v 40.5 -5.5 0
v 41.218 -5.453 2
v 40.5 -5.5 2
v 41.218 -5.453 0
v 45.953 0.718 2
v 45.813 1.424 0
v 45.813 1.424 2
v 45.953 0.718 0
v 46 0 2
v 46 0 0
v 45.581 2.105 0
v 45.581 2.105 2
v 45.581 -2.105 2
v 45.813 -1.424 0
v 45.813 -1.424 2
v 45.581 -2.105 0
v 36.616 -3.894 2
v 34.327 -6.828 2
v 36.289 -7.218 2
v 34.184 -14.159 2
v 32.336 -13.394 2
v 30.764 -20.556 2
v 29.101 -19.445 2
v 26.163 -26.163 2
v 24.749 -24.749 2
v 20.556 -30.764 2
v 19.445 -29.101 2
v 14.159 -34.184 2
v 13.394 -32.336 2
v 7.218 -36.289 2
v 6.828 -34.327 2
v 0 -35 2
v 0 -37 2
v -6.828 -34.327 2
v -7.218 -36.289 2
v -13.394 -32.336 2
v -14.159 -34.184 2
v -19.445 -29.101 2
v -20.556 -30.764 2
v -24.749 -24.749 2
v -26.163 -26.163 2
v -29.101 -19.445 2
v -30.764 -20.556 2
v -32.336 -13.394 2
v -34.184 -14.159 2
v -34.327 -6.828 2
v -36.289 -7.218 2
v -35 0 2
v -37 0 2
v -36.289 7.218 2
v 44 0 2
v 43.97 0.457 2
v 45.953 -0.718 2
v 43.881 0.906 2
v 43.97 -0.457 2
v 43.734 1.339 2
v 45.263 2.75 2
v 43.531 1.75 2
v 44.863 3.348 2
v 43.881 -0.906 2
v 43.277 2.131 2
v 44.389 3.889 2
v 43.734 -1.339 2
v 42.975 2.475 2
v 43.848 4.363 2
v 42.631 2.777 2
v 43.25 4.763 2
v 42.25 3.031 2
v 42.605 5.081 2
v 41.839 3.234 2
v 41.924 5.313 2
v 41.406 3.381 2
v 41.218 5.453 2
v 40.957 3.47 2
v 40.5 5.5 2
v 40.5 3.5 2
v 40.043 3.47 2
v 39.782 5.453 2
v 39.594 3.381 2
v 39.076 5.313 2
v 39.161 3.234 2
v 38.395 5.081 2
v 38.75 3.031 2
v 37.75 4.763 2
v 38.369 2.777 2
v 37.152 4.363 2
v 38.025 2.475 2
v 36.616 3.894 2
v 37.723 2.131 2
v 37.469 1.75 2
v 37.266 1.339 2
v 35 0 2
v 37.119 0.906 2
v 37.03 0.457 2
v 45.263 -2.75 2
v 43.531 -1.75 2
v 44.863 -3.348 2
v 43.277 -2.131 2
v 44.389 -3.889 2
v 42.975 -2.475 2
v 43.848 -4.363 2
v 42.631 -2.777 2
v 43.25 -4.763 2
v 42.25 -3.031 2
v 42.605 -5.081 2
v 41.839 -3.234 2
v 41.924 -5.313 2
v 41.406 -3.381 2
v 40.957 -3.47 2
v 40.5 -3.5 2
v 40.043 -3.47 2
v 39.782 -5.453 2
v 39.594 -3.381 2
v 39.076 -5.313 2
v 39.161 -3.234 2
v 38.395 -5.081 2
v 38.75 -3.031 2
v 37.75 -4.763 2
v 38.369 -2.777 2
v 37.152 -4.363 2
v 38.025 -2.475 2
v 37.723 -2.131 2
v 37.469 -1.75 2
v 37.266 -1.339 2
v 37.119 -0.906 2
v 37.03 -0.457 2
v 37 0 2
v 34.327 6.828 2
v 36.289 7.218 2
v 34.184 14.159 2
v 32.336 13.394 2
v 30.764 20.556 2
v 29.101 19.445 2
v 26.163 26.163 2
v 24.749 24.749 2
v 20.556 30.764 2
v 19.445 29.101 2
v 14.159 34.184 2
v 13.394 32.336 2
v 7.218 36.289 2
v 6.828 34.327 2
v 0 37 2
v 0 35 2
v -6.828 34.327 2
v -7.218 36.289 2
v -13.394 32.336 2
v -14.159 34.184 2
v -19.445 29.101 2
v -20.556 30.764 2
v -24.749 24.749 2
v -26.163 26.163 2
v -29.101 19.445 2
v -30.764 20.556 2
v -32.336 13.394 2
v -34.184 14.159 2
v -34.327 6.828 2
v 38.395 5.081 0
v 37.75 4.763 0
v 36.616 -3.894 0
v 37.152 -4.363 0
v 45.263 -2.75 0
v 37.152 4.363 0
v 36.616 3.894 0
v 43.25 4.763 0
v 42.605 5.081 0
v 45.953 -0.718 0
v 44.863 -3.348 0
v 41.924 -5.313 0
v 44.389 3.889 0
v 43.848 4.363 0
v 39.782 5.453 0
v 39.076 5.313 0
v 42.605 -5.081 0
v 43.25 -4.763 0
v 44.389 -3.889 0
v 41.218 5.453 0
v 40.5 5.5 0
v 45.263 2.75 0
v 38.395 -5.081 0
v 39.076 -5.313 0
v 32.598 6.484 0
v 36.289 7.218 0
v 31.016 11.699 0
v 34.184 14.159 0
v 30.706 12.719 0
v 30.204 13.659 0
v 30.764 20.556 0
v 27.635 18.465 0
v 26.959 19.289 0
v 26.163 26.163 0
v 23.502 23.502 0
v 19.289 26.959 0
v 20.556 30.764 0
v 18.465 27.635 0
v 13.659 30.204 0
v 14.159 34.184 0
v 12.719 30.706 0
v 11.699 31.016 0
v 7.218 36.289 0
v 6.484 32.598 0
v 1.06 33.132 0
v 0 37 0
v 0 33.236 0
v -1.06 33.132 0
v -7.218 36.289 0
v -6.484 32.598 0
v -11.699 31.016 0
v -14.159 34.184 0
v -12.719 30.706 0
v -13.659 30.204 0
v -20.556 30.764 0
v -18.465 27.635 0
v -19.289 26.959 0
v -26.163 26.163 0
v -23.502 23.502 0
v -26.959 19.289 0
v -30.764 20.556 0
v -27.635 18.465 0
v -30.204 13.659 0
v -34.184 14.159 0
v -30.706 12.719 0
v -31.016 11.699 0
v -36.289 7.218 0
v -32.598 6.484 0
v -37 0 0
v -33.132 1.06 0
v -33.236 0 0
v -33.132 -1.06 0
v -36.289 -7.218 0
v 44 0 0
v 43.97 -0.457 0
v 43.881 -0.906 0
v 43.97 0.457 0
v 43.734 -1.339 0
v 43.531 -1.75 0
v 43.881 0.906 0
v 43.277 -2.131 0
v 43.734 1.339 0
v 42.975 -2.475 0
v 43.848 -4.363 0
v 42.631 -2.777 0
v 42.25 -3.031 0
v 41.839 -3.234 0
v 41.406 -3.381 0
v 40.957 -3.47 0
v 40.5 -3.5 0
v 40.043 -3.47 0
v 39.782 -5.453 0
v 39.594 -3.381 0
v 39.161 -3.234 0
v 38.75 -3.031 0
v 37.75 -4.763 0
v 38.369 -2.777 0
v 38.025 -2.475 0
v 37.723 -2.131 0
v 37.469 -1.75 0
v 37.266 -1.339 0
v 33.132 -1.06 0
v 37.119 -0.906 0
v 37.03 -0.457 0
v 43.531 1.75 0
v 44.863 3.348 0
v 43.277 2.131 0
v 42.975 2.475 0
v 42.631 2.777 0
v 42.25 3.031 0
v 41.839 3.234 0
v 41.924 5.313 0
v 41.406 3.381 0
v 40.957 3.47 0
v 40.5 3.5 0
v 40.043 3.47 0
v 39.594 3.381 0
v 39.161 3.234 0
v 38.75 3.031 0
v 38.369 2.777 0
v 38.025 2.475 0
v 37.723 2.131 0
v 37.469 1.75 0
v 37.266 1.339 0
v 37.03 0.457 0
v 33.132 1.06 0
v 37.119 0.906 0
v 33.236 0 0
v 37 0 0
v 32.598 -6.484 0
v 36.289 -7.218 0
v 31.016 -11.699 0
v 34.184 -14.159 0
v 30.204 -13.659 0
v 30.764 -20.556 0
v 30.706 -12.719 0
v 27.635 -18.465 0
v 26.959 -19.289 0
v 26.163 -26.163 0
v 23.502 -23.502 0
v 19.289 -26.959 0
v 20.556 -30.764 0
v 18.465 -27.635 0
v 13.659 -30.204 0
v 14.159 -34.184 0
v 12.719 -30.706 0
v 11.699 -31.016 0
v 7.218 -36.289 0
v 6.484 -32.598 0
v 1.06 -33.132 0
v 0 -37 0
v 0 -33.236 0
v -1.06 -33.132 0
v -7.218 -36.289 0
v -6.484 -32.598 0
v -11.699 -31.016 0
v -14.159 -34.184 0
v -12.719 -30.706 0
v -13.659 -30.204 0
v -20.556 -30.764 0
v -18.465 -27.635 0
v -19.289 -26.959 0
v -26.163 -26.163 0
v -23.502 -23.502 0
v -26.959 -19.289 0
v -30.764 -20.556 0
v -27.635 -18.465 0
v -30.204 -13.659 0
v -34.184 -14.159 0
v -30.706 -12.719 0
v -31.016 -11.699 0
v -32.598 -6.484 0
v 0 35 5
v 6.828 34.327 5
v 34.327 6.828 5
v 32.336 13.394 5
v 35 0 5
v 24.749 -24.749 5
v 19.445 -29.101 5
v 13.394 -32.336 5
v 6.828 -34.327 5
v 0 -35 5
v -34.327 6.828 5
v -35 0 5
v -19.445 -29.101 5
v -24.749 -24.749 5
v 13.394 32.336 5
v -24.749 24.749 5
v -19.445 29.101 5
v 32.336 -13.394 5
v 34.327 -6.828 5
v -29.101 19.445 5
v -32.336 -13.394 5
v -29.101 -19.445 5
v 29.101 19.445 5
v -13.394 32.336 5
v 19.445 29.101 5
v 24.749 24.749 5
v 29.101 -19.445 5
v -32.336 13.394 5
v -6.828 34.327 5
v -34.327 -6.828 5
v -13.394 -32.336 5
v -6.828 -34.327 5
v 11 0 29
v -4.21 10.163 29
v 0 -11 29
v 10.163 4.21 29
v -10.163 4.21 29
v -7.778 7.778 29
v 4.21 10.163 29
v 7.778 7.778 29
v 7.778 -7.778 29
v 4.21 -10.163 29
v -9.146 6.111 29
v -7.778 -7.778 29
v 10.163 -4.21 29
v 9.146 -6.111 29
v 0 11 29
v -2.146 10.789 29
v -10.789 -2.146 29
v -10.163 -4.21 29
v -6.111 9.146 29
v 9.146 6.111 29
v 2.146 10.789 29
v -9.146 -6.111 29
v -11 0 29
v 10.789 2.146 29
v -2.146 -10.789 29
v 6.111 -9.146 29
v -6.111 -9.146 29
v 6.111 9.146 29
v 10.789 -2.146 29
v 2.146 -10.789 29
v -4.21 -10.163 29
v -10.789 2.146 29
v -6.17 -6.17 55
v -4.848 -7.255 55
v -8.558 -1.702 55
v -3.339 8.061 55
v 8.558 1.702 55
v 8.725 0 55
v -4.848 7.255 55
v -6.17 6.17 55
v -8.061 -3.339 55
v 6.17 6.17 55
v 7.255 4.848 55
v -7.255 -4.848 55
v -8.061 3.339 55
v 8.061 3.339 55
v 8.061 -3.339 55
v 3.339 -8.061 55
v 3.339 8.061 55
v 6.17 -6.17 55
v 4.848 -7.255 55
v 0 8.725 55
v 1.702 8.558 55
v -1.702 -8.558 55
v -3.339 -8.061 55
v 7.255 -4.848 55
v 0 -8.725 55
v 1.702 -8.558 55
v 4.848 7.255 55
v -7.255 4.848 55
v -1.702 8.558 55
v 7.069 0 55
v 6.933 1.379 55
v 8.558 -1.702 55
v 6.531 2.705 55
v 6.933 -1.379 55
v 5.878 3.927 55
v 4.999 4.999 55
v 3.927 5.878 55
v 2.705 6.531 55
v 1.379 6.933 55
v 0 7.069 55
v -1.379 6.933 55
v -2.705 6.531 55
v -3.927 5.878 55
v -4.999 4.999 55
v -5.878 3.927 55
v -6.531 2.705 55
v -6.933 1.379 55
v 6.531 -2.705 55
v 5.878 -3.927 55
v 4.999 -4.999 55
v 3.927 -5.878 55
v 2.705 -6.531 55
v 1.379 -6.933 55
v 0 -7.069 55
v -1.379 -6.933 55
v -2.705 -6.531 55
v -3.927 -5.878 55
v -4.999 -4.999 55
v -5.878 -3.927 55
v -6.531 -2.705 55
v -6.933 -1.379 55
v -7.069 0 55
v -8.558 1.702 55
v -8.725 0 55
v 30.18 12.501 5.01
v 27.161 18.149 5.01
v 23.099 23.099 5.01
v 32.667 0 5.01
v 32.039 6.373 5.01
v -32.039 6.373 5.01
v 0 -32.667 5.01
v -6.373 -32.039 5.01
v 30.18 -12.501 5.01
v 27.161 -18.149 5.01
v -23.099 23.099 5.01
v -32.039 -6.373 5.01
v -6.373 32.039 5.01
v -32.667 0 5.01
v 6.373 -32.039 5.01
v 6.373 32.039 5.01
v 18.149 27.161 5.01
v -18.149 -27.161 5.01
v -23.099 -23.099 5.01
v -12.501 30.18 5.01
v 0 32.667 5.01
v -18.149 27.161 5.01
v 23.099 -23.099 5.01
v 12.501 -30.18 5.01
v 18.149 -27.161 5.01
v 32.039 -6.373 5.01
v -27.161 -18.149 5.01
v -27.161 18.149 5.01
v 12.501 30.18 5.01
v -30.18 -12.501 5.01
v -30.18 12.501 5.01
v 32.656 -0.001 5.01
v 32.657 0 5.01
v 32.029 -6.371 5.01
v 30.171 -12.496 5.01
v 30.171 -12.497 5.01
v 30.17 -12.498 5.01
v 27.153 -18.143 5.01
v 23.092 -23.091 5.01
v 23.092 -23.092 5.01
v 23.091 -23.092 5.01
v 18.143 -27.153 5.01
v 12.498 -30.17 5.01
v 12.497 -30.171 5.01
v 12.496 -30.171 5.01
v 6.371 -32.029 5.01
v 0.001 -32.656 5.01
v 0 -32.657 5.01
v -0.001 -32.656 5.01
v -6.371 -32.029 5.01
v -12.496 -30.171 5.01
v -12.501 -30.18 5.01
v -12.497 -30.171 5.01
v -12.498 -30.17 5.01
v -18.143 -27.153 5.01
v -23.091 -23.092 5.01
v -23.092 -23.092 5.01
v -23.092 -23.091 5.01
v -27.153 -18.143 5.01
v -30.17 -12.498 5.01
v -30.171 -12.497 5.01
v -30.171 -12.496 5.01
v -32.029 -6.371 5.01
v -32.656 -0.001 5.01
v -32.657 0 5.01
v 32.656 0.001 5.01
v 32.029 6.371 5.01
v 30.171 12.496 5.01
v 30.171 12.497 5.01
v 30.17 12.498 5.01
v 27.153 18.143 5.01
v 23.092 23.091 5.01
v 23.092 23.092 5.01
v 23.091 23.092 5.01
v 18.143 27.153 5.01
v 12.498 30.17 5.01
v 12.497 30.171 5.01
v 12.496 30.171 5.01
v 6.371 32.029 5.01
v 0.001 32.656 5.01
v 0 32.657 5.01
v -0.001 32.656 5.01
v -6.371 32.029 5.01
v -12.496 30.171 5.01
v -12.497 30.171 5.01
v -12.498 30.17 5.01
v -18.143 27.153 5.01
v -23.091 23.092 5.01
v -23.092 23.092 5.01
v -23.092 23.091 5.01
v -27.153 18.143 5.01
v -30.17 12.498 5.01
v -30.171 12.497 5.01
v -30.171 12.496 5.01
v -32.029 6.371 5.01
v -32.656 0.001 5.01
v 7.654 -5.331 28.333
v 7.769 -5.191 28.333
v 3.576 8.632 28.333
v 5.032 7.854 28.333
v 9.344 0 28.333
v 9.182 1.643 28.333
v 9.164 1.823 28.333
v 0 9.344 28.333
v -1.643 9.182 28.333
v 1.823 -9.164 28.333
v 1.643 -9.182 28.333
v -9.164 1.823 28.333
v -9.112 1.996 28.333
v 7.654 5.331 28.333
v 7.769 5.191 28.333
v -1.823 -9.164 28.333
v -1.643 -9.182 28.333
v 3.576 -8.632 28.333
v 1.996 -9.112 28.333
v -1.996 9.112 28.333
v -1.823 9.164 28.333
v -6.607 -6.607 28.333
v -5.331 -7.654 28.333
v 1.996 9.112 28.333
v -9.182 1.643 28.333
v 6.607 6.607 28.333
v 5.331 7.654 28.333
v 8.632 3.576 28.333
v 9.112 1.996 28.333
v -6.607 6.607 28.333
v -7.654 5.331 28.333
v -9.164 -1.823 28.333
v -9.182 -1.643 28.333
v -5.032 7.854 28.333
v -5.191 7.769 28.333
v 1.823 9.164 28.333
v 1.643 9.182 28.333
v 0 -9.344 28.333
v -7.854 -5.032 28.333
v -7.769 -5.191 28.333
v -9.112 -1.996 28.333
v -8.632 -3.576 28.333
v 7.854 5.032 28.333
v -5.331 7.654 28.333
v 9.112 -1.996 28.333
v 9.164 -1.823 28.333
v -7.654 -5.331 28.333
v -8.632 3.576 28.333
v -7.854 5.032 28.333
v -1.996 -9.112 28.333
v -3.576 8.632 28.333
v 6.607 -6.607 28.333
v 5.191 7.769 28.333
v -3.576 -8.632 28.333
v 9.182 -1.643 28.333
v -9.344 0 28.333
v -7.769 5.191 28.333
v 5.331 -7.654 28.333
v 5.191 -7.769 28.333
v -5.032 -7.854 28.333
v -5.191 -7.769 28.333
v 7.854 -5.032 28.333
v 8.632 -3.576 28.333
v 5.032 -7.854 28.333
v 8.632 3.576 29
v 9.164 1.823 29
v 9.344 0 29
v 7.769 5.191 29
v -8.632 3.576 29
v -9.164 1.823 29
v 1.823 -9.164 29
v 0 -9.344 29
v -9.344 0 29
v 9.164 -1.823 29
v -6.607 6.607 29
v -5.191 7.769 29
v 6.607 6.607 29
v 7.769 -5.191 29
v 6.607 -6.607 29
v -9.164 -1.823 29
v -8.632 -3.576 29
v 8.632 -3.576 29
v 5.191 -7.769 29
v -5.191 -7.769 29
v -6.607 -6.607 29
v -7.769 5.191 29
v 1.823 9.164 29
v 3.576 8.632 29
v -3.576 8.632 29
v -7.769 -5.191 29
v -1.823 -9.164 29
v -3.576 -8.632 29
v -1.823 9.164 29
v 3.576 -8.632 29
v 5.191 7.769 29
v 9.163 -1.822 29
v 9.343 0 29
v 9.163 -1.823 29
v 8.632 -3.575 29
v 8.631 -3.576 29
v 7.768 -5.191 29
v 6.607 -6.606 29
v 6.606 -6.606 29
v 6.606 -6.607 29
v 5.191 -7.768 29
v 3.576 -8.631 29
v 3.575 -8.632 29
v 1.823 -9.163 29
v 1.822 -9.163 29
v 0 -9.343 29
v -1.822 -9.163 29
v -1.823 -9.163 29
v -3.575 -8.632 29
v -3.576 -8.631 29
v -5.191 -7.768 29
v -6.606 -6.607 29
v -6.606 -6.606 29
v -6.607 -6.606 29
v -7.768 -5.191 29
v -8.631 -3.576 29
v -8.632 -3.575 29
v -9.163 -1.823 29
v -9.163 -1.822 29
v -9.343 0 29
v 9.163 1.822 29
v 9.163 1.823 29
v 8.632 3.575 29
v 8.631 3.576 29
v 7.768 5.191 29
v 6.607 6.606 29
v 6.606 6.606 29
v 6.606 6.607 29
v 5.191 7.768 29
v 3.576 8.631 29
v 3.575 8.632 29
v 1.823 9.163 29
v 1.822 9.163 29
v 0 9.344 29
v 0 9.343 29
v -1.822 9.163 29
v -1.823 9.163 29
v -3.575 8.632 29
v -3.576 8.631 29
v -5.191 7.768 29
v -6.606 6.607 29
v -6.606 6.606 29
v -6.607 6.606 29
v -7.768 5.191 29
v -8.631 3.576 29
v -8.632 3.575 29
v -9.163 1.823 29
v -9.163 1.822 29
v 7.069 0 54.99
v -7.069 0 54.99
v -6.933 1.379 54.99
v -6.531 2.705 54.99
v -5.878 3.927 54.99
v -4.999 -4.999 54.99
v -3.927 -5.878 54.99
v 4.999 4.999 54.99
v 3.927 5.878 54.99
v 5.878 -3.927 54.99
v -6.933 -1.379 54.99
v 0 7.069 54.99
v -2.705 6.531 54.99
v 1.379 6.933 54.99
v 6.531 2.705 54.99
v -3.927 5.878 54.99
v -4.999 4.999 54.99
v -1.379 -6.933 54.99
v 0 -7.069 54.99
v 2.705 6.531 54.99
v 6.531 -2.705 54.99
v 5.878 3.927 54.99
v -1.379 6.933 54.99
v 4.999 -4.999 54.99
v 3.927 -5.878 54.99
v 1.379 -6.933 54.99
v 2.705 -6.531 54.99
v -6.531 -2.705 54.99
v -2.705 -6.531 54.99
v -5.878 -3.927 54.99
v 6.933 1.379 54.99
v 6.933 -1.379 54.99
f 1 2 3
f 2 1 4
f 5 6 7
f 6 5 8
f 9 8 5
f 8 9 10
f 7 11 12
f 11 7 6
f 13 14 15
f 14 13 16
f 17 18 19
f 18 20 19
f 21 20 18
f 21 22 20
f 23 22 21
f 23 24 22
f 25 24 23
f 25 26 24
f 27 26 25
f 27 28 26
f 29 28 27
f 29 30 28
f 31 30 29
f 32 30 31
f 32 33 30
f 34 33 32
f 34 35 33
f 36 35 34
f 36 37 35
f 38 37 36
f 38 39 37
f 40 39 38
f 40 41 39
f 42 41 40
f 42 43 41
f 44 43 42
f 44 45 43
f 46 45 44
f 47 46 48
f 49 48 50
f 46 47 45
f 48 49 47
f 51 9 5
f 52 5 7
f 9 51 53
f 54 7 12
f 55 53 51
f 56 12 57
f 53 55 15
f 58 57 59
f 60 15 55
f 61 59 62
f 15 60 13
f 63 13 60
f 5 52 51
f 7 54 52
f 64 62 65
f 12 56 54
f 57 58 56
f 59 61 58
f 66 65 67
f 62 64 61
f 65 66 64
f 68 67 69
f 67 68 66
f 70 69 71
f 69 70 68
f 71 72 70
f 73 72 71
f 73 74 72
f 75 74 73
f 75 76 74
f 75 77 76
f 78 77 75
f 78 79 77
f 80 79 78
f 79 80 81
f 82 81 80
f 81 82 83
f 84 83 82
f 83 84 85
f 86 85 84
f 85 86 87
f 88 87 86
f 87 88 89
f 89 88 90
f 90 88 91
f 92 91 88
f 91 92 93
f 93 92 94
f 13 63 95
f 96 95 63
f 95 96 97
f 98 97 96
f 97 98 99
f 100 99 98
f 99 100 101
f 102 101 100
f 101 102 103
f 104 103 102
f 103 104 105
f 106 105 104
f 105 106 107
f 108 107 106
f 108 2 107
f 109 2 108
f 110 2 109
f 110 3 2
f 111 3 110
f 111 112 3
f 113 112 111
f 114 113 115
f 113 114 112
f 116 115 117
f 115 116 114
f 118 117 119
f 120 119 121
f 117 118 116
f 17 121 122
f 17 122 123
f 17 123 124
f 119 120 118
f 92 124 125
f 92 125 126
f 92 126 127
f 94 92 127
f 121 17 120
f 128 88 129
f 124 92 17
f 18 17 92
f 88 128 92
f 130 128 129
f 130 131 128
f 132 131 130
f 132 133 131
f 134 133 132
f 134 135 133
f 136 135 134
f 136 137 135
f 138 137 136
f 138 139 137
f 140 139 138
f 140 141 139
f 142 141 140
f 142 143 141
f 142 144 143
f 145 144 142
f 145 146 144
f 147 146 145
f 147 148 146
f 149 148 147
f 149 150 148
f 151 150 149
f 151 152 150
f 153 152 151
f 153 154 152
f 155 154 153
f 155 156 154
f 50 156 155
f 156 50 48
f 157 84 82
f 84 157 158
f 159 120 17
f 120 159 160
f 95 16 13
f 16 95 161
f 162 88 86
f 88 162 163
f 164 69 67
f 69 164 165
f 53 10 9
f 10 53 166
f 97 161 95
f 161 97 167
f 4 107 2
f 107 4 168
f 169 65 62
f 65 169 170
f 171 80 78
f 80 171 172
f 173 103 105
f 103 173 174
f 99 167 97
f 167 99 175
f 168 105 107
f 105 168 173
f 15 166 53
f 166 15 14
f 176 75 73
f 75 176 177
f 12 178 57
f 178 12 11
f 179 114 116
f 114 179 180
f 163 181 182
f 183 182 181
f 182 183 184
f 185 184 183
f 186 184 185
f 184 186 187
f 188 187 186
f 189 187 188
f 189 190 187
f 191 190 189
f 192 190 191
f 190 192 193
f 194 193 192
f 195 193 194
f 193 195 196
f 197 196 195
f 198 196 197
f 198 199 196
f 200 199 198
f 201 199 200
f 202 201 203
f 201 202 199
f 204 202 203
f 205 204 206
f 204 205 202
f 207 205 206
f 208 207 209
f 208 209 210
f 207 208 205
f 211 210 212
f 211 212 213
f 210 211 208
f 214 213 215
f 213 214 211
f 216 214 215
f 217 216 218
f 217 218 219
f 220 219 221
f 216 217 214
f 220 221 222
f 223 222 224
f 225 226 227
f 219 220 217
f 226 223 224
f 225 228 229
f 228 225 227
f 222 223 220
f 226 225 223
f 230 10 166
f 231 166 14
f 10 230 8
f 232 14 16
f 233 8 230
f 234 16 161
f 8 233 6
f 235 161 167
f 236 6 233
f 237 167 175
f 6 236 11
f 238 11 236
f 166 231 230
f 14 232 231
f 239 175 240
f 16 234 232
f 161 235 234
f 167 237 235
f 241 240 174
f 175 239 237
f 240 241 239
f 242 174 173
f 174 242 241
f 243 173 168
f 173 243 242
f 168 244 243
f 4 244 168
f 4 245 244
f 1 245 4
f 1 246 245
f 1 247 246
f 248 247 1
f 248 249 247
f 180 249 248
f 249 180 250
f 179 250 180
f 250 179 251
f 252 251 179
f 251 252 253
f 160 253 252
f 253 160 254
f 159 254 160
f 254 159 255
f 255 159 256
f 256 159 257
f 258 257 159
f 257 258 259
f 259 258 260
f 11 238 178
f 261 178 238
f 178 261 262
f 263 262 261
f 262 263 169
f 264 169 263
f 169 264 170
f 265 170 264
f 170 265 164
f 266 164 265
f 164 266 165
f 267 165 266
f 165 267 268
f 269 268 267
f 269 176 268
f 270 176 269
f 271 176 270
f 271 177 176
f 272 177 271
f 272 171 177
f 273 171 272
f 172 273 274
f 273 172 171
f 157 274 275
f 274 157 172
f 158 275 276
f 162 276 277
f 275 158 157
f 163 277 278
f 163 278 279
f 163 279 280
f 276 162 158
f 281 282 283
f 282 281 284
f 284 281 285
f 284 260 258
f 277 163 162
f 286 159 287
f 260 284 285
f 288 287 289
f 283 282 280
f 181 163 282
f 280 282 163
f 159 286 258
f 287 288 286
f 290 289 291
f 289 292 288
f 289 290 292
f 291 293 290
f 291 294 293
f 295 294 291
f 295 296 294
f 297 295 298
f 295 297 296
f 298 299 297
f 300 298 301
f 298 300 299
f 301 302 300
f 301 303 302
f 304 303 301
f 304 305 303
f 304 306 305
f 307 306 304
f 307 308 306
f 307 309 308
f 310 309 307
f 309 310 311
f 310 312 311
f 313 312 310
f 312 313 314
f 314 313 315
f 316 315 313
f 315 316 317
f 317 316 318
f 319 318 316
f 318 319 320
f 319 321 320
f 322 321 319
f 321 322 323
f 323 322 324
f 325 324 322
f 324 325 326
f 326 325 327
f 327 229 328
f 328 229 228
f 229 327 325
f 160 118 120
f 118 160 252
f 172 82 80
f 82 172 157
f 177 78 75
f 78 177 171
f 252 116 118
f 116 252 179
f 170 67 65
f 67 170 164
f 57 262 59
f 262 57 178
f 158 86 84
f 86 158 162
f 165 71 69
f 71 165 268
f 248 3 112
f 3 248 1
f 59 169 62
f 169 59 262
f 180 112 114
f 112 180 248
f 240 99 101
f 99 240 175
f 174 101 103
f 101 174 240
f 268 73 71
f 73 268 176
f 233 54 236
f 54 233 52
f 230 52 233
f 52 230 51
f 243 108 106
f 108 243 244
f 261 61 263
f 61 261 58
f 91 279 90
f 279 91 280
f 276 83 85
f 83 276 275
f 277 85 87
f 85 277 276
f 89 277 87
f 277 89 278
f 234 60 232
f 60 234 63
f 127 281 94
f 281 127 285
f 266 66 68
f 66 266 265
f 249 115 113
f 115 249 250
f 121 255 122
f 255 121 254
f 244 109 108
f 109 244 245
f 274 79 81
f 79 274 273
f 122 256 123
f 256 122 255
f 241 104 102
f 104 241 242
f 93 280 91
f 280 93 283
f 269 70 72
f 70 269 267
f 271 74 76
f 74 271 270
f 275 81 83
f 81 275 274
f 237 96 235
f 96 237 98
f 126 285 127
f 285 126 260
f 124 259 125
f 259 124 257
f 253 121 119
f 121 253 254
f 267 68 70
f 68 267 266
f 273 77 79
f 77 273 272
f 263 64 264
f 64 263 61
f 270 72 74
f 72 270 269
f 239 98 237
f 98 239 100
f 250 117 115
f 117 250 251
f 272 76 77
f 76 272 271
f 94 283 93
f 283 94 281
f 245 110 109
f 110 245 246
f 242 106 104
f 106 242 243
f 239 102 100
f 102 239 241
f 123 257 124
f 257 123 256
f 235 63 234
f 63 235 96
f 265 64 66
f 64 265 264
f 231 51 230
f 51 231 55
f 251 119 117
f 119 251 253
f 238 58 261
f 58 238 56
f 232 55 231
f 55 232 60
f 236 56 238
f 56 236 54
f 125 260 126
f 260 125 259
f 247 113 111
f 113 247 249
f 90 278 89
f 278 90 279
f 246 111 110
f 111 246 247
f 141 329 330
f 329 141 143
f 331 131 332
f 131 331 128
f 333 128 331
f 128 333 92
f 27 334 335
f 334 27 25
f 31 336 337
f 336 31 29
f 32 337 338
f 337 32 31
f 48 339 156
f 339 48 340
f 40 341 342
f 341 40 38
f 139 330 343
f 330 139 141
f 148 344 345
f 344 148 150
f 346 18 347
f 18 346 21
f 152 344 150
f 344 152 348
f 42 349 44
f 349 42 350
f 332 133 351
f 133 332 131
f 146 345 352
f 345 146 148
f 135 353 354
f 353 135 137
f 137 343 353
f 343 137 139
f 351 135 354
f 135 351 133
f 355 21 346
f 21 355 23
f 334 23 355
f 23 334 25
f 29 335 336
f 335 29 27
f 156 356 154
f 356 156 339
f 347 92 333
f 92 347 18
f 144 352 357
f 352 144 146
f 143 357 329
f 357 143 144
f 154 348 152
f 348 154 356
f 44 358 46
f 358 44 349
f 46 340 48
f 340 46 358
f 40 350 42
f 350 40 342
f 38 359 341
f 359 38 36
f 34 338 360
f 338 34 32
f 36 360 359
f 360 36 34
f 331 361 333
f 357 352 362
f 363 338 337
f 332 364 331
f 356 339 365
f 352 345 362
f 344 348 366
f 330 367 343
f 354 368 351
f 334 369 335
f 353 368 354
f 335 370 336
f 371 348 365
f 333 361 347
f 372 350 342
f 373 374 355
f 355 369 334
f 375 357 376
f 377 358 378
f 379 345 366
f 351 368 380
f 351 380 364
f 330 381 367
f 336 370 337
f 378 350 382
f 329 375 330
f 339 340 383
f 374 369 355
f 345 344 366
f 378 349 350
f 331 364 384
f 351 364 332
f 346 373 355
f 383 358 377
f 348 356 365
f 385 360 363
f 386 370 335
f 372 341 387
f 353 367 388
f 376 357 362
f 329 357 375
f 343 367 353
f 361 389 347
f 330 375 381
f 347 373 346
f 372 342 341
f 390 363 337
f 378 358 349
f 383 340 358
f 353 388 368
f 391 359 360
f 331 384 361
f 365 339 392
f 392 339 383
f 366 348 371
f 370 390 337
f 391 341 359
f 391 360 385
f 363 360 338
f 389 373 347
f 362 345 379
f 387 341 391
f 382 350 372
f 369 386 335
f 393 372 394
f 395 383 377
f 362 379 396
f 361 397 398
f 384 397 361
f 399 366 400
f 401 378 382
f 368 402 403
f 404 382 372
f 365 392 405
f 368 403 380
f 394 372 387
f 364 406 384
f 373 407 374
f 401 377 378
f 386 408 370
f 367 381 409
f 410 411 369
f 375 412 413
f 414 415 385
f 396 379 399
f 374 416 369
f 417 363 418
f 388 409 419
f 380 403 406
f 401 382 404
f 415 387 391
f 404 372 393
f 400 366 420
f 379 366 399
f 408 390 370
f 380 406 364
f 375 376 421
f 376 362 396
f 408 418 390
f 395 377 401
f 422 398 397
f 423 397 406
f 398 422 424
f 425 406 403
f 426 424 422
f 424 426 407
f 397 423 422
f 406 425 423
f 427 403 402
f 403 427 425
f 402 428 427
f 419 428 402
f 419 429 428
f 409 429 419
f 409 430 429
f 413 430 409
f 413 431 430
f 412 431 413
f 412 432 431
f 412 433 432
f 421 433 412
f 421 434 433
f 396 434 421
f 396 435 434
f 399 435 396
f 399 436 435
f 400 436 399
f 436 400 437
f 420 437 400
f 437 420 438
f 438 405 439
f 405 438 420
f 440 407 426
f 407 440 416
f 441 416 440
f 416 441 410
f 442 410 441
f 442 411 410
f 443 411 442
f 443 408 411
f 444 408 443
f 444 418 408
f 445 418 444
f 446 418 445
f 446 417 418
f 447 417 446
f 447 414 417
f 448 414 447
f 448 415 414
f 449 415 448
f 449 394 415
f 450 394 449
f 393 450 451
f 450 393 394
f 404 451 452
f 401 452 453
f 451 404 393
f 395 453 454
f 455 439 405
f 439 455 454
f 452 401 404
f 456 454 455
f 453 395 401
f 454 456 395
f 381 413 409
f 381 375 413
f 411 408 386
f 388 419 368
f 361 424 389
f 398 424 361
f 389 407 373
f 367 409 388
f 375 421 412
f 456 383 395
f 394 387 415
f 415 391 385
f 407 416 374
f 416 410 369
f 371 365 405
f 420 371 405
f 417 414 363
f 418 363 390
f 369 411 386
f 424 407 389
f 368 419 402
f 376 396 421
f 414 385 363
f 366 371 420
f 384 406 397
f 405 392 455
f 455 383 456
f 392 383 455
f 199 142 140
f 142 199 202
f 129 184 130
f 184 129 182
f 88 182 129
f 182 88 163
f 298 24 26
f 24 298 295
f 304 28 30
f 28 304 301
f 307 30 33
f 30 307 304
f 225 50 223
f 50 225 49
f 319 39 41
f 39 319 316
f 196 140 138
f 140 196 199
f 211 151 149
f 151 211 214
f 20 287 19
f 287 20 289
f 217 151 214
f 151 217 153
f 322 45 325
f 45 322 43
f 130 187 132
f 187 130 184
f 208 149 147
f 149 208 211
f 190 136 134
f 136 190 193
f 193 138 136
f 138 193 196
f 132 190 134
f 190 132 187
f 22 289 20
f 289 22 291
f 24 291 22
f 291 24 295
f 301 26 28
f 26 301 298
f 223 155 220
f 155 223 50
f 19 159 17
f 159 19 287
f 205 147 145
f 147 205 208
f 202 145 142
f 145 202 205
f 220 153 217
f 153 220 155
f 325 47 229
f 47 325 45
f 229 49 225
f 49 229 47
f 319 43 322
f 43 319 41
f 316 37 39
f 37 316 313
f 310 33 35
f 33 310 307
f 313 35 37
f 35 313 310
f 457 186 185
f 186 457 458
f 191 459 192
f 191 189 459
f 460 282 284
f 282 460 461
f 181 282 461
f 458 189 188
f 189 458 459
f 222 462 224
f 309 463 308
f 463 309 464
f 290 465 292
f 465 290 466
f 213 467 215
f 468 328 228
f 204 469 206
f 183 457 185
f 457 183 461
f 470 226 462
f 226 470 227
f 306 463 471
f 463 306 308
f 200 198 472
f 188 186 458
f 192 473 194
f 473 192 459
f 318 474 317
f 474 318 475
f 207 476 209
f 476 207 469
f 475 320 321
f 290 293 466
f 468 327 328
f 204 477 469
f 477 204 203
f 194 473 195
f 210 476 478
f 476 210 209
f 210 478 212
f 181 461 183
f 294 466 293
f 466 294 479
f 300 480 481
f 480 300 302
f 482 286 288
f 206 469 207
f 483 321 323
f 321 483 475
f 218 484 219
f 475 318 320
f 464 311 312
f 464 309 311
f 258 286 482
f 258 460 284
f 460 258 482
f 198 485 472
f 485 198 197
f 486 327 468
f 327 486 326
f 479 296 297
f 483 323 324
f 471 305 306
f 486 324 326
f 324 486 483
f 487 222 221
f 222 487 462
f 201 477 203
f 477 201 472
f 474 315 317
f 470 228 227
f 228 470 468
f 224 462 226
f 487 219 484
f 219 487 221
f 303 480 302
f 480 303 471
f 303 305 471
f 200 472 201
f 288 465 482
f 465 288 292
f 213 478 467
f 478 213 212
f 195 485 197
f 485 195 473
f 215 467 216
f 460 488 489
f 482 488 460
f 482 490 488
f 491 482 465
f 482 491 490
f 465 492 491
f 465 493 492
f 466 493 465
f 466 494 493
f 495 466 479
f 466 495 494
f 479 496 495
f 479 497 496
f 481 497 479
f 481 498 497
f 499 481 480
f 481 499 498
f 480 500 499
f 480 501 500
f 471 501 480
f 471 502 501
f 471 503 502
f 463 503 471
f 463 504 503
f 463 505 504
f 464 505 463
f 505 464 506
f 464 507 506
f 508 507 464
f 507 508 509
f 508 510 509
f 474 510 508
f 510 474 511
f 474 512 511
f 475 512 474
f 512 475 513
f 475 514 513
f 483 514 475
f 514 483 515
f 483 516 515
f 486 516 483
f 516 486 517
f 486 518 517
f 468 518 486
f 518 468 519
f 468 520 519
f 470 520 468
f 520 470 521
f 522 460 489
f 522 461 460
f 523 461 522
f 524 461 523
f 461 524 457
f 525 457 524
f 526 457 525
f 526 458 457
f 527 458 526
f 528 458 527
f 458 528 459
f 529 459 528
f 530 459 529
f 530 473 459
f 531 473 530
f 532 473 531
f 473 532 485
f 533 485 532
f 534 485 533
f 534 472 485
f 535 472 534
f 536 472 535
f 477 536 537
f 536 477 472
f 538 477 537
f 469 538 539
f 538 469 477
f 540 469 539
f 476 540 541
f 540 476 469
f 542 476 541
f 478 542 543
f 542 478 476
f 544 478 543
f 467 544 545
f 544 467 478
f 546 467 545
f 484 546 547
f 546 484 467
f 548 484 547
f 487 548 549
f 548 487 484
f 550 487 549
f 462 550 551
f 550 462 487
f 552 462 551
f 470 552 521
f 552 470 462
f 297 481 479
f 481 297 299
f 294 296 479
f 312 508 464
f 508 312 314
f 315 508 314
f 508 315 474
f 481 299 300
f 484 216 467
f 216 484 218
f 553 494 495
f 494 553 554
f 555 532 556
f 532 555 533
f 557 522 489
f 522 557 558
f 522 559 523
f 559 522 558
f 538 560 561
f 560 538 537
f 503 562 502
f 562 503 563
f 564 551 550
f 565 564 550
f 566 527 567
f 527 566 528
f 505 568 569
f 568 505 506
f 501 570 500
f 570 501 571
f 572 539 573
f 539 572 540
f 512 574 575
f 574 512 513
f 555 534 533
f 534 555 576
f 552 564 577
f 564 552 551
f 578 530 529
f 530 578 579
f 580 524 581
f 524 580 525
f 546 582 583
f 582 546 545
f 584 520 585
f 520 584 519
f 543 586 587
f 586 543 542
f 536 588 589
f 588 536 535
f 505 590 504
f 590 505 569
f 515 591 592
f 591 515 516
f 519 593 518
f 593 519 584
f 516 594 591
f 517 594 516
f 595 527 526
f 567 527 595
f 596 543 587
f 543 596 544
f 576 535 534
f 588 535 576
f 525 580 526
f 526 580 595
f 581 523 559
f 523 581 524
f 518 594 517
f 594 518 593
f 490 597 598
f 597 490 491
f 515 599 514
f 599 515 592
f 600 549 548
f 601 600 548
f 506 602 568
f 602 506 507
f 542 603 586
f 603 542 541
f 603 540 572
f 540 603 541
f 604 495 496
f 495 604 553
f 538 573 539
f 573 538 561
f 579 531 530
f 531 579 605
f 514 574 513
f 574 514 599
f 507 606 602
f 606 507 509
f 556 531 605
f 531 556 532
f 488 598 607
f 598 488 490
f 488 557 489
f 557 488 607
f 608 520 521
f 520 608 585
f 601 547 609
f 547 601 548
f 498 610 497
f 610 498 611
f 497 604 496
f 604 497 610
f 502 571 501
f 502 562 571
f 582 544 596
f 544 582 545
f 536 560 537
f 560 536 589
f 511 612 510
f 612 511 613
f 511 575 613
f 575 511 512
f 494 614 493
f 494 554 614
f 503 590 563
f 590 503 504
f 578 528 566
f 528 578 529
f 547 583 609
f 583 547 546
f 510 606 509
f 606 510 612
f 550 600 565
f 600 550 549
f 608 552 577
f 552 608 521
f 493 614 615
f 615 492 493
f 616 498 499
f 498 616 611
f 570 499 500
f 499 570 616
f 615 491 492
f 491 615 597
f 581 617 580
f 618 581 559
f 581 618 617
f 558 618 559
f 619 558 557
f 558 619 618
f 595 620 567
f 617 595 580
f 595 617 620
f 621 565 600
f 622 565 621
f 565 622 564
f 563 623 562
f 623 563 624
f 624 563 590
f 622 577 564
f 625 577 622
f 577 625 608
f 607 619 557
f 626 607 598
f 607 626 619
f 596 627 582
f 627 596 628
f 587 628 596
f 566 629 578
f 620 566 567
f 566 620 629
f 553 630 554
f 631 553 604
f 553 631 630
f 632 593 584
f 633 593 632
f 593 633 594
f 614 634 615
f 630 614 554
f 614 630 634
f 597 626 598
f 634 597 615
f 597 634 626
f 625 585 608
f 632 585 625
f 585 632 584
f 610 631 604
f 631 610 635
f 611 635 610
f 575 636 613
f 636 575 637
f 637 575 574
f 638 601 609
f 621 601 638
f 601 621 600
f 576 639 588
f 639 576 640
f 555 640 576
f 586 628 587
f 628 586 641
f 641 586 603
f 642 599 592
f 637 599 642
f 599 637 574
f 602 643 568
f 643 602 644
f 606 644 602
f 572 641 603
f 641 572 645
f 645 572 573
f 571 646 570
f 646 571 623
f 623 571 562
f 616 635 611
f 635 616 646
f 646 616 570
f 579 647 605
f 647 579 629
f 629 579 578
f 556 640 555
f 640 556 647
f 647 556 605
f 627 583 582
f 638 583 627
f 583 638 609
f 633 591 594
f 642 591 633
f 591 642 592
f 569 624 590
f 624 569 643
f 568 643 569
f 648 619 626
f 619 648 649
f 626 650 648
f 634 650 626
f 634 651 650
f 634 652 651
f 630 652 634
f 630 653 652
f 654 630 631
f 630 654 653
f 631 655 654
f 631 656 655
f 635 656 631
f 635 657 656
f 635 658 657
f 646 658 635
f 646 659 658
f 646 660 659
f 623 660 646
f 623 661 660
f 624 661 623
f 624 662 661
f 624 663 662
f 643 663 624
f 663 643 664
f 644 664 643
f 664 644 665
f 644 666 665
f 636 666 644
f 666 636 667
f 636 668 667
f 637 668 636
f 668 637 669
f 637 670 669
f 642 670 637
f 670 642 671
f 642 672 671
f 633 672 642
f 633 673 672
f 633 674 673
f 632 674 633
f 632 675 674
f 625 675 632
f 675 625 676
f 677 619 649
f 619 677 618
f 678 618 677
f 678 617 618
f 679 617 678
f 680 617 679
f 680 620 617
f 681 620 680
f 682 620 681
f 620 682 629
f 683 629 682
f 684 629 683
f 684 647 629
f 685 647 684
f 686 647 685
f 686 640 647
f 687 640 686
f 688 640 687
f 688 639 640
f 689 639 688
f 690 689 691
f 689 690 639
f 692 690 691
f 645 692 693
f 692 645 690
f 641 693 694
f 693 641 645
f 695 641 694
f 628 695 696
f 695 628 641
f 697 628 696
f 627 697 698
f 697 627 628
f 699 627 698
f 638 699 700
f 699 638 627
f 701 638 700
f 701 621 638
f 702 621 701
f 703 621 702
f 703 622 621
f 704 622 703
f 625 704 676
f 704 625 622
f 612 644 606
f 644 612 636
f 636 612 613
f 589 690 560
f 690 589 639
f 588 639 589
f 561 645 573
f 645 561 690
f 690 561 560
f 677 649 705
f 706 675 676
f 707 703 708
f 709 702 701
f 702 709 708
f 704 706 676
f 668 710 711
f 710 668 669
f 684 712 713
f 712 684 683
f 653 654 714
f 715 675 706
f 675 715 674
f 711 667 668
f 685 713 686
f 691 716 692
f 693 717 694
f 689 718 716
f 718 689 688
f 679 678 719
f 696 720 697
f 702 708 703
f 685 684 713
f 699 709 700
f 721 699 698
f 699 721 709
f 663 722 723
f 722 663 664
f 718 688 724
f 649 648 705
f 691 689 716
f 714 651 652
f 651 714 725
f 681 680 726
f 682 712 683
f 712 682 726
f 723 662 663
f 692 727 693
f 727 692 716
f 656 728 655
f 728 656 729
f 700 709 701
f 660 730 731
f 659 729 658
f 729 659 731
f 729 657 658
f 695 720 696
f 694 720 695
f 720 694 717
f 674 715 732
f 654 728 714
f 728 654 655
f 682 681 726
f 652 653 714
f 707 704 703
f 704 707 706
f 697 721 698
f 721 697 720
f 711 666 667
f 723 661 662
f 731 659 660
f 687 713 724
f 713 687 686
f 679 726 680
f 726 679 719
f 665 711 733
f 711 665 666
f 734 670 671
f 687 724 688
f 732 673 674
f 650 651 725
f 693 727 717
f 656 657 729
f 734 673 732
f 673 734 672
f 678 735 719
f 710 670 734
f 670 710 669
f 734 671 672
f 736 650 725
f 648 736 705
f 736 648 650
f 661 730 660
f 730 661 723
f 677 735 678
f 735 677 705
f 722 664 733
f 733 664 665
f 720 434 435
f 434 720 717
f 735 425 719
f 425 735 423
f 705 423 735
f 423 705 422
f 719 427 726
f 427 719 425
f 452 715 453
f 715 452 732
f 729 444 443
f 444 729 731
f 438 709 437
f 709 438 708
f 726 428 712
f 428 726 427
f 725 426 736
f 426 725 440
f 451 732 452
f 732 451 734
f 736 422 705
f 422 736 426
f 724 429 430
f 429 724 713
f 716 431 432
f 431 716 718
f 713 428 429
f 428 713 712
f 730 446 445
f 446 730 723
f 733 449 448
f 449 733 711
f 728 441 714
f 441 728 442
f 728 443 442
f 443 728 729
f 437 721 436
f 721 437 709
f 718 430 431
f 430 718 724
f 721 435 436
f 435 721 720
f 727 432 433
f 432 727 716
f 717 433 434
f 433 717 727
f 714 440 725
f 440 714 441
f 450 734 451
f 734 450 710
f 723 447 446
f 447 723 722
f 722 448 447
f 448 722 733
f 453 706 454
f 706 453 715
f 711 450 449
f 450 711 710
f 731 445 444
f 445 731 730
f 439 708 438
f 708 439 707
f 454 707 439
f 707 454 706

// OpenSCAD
//Customizable Funnel
//8/31/2016     By: David Bunch
//
//1. Outside Diameter of Big Part of Funnel
Big_OD = 70;    //[12:1:200]

//2. Height of Big Part of Funnel before Flare
Big_Ht = 5;     //[0:1:50]

//3. Thickness of Funnel
Thk = 1.65;         //[1:.1:5]

//4. Flare Angle of Big Part of Funnel
Big_Ang = 45;   //[30:1:80]

//5. Outside Diameter of Small Part of Funnel
Small_OD = 22;    //[6:1:100]

//6. Height of Small Part of Funnel
Small_Ht = 26;     //[6:1:50]

//7. Small Flared Angle (75 to 90 degress)
Small_Ang = 85;   //[75:1:90]

//8. Resolution of Funnel 
Ires = 32;           //[4:2:72]

//9. Draw Eyelet to hang Funnel from (yes, or no)
Draw_Eye = "yes";  //[yes,no]

//10. Outside Diameter of Eyelet
Eye_OD = 11;       //[7:1:20]

//11. Inside Diameter of Eyelet
Eye_ID = 7;        //[1:1:18]

//12. Height of Eyelet Hanger
Eye_Ht = 2;        //[.1:.1:3]

//13. How Thick to draw a Lip around Print Base of Funnel
Lip_Thk = 2;        //[0:.5:20]

//14. How High is the Lip
Lip_Ht = 2;         //[.5:.5:6]

/* [Hidden] */

Small_Thk = Thk;       //Thickness at Bottom smaller part can be different from Top
                                        //Generally the same as Thk, but you can change it
Lip_OD = Big_OD + (2 * Lip_Thk);        //Diameter including the Lip Width
Lip_Rad = Lip_OD / 2;                   //Radius of Lip
Big_OD1 = Big_OD - (Thk * 2);       //Only used if Big_Ht > 0
Big_Rad = Big_OD / 2;               //Radius of Top Part of Funnel
Small_Rad = Small_OD / 2;           //Radius of Bottom Part of Funnel
Small_ID = Small_OD - (Small_Thk * 2);    //Inside Diameter of Smallest part of Funnel
Fun_TopHt = (Big_Rad - Small_Rad) * tan(Big_Ang);     //Height of Funnel Top to Center Line
Fun_Thk = Thk / sin(Big_Ang);       //Funnel Thickness based on Angle used
                                    //Need this to calculate actual Inside Diameters of flared part
Fun_Top_ID = Big_OD - (Fun_Thk * 2);        //Inside Diameter of Big part of Funnel
Fun_Top_ID1 = Small_OD - (Fun_Thk * 2);
Bot_Fun_90Ang = 90 - Small_Ang;             //Need smaller Angle
Bot_Fun_Thk = Small_Thk / cos(Bot_Fun_90Ang);
Bot_Fun_ID = Small_OD - (Bot_Fun_Thk * 2);      //Lower flared portion of Funnel Inside Diameter

Tot_Ht = Fun_TopHt + Small_Ht + Big_Ht;     //Total Height of Funnel
//            cylinder(d1=Fun_Top_ID,d2=Bot_Fun_ID,h=Fun_TopHt+.01);
Bot_Flare_Dist = Small_Ht * tan(Bot_Fun_90Ang);
Bot_Fun_OD1 = Small_OD - (Bot_Flare_Dist * 2);
Bot_Fun_ID1 = Bot_Fun_OD1 - (2 * Bot_Fun_Thk);

echo(Bot_Fun_Thk = Bot_Fun_Thk);
echo(Fun_TopHt = Fun_TopHt);
echo(Fun_Thk = Fun_Thk);
echo(Fun_Top_ID = Fun_Top_ID);

echo(Tot_Ht = Tot_Ht);
echo(Bot_Fun_90Ang = Bot_Fun_90Ang);
echo(Bot_Flare_Dist = Bot_Flare_Dist);
echo(Bot_Fun_OD1 = Bot_Fun_OD1);
echo(Bot_Fun_ID = Bot_Fun_ID);
echo(Bot_Fun_ID1 = Bot_Fun_ID1);
Big_OD_Res = (round(((Big_OD * 3.14)/4) / 1.0)*4);  //about 1.0mm segments
Eye_OD_Res = (round(((Eye_OD * 3.14)/4) / .7)*4);
echo(Big_OD_Res = Big_OD_Res);
$fn=Ires;               //Set Resolution so we do not need to add it to cylinder()'s
//$fn = Big_OD_Res;       //If you prefer about 1mm resolution on segments, uncomment this

module DrawFunnel()
{
    difference()
    {
        union()
        {
            if (Big_Ht > 0)
            {
                cylinder(d=Big_OD,h=Big_Ht);
            }
//Flared Outside Big part of Funnel
            translate([0,0,Big_Ht])
            cylinder(d1=Big_OD,d2=Small_OD,h=Fun_TopHt);
//Flared or Straight Small part of Funnel
            translate([0,0,Fun_TopHt+Big_Ht])
            cylinder(d1=Small_OD,d2=Bot_Fun_OD1,h=Small_Ht);     
            if (Draw_Eye == "yes")
            {
                translate([(Lip_Rad + (Eye_ID/2)),0,0])
                difference()
                {
                    cylinder(d=Eye_OD,h=Eye_Ht,$fn=Eye_OD_Res);
                    translate([0,0,-1])
                    cylinder(d=Eye_ID,h=Eye_Ht+2,$fn=Eye_OD_Res);
                }
            }
//See if we need to draw a lip around the Funnel
            if (Lip_Thk > 0)
            {
                cylinder(d=Lip_OD,h=Lip_Ht);
            }
        }
        if (Big_Ht > 0)
        {
            translate([0,0,-1])
            cylinder(d1=Big_OD1,d2=Fun_Top_ID,h=Big_Ht+1.01);
            translate([0,0,Big_Ht])
            cylinder(d1=Fun_Top_ID,d2=Fun_Top_ID1,h=Fun_TopHt+.01);
        } else
        {
            translate([0,0,Big_Ht-.01])
            cylinder(d1=Fun_Top_ID,d2=Bot_Fun_ID,h=Fun_TopHt+.01);
        }
        if (Small_Ang > 0)
        {
            translate([0,0,Big_Ht+Fun_TopHt-10])
            cylinder(d=Bot_Fun_ID,h=10);     //Flared cut small part of Funnel
            translate([0,0,Big_Ht+Fun_TopHt-.01])
            cylinder(d1=Bot_Fun_ID,d2=Bot_Fun_ID1,h=Small_Ht);     //Flared cut small part of Funnel
            translate([0,0,-1])
            cylinder(d=Bot_Fun_ID1,h=Tot_Ht+2);
        } else
        {
            translate([0,0,-1])
            cylinder(d=Small_ID,h=Tot_Ht+2);
        }
//        translate([-Big_OD,0,-1])
//        cube([Big_OD*2,Big_OD,Tot_Ht+2]);       //Cross section to see Thickness width
    }
}
DrawFunnel();
//%cylinder(d=Big_OD,h=Tot_Ht);     //Check Total Height
